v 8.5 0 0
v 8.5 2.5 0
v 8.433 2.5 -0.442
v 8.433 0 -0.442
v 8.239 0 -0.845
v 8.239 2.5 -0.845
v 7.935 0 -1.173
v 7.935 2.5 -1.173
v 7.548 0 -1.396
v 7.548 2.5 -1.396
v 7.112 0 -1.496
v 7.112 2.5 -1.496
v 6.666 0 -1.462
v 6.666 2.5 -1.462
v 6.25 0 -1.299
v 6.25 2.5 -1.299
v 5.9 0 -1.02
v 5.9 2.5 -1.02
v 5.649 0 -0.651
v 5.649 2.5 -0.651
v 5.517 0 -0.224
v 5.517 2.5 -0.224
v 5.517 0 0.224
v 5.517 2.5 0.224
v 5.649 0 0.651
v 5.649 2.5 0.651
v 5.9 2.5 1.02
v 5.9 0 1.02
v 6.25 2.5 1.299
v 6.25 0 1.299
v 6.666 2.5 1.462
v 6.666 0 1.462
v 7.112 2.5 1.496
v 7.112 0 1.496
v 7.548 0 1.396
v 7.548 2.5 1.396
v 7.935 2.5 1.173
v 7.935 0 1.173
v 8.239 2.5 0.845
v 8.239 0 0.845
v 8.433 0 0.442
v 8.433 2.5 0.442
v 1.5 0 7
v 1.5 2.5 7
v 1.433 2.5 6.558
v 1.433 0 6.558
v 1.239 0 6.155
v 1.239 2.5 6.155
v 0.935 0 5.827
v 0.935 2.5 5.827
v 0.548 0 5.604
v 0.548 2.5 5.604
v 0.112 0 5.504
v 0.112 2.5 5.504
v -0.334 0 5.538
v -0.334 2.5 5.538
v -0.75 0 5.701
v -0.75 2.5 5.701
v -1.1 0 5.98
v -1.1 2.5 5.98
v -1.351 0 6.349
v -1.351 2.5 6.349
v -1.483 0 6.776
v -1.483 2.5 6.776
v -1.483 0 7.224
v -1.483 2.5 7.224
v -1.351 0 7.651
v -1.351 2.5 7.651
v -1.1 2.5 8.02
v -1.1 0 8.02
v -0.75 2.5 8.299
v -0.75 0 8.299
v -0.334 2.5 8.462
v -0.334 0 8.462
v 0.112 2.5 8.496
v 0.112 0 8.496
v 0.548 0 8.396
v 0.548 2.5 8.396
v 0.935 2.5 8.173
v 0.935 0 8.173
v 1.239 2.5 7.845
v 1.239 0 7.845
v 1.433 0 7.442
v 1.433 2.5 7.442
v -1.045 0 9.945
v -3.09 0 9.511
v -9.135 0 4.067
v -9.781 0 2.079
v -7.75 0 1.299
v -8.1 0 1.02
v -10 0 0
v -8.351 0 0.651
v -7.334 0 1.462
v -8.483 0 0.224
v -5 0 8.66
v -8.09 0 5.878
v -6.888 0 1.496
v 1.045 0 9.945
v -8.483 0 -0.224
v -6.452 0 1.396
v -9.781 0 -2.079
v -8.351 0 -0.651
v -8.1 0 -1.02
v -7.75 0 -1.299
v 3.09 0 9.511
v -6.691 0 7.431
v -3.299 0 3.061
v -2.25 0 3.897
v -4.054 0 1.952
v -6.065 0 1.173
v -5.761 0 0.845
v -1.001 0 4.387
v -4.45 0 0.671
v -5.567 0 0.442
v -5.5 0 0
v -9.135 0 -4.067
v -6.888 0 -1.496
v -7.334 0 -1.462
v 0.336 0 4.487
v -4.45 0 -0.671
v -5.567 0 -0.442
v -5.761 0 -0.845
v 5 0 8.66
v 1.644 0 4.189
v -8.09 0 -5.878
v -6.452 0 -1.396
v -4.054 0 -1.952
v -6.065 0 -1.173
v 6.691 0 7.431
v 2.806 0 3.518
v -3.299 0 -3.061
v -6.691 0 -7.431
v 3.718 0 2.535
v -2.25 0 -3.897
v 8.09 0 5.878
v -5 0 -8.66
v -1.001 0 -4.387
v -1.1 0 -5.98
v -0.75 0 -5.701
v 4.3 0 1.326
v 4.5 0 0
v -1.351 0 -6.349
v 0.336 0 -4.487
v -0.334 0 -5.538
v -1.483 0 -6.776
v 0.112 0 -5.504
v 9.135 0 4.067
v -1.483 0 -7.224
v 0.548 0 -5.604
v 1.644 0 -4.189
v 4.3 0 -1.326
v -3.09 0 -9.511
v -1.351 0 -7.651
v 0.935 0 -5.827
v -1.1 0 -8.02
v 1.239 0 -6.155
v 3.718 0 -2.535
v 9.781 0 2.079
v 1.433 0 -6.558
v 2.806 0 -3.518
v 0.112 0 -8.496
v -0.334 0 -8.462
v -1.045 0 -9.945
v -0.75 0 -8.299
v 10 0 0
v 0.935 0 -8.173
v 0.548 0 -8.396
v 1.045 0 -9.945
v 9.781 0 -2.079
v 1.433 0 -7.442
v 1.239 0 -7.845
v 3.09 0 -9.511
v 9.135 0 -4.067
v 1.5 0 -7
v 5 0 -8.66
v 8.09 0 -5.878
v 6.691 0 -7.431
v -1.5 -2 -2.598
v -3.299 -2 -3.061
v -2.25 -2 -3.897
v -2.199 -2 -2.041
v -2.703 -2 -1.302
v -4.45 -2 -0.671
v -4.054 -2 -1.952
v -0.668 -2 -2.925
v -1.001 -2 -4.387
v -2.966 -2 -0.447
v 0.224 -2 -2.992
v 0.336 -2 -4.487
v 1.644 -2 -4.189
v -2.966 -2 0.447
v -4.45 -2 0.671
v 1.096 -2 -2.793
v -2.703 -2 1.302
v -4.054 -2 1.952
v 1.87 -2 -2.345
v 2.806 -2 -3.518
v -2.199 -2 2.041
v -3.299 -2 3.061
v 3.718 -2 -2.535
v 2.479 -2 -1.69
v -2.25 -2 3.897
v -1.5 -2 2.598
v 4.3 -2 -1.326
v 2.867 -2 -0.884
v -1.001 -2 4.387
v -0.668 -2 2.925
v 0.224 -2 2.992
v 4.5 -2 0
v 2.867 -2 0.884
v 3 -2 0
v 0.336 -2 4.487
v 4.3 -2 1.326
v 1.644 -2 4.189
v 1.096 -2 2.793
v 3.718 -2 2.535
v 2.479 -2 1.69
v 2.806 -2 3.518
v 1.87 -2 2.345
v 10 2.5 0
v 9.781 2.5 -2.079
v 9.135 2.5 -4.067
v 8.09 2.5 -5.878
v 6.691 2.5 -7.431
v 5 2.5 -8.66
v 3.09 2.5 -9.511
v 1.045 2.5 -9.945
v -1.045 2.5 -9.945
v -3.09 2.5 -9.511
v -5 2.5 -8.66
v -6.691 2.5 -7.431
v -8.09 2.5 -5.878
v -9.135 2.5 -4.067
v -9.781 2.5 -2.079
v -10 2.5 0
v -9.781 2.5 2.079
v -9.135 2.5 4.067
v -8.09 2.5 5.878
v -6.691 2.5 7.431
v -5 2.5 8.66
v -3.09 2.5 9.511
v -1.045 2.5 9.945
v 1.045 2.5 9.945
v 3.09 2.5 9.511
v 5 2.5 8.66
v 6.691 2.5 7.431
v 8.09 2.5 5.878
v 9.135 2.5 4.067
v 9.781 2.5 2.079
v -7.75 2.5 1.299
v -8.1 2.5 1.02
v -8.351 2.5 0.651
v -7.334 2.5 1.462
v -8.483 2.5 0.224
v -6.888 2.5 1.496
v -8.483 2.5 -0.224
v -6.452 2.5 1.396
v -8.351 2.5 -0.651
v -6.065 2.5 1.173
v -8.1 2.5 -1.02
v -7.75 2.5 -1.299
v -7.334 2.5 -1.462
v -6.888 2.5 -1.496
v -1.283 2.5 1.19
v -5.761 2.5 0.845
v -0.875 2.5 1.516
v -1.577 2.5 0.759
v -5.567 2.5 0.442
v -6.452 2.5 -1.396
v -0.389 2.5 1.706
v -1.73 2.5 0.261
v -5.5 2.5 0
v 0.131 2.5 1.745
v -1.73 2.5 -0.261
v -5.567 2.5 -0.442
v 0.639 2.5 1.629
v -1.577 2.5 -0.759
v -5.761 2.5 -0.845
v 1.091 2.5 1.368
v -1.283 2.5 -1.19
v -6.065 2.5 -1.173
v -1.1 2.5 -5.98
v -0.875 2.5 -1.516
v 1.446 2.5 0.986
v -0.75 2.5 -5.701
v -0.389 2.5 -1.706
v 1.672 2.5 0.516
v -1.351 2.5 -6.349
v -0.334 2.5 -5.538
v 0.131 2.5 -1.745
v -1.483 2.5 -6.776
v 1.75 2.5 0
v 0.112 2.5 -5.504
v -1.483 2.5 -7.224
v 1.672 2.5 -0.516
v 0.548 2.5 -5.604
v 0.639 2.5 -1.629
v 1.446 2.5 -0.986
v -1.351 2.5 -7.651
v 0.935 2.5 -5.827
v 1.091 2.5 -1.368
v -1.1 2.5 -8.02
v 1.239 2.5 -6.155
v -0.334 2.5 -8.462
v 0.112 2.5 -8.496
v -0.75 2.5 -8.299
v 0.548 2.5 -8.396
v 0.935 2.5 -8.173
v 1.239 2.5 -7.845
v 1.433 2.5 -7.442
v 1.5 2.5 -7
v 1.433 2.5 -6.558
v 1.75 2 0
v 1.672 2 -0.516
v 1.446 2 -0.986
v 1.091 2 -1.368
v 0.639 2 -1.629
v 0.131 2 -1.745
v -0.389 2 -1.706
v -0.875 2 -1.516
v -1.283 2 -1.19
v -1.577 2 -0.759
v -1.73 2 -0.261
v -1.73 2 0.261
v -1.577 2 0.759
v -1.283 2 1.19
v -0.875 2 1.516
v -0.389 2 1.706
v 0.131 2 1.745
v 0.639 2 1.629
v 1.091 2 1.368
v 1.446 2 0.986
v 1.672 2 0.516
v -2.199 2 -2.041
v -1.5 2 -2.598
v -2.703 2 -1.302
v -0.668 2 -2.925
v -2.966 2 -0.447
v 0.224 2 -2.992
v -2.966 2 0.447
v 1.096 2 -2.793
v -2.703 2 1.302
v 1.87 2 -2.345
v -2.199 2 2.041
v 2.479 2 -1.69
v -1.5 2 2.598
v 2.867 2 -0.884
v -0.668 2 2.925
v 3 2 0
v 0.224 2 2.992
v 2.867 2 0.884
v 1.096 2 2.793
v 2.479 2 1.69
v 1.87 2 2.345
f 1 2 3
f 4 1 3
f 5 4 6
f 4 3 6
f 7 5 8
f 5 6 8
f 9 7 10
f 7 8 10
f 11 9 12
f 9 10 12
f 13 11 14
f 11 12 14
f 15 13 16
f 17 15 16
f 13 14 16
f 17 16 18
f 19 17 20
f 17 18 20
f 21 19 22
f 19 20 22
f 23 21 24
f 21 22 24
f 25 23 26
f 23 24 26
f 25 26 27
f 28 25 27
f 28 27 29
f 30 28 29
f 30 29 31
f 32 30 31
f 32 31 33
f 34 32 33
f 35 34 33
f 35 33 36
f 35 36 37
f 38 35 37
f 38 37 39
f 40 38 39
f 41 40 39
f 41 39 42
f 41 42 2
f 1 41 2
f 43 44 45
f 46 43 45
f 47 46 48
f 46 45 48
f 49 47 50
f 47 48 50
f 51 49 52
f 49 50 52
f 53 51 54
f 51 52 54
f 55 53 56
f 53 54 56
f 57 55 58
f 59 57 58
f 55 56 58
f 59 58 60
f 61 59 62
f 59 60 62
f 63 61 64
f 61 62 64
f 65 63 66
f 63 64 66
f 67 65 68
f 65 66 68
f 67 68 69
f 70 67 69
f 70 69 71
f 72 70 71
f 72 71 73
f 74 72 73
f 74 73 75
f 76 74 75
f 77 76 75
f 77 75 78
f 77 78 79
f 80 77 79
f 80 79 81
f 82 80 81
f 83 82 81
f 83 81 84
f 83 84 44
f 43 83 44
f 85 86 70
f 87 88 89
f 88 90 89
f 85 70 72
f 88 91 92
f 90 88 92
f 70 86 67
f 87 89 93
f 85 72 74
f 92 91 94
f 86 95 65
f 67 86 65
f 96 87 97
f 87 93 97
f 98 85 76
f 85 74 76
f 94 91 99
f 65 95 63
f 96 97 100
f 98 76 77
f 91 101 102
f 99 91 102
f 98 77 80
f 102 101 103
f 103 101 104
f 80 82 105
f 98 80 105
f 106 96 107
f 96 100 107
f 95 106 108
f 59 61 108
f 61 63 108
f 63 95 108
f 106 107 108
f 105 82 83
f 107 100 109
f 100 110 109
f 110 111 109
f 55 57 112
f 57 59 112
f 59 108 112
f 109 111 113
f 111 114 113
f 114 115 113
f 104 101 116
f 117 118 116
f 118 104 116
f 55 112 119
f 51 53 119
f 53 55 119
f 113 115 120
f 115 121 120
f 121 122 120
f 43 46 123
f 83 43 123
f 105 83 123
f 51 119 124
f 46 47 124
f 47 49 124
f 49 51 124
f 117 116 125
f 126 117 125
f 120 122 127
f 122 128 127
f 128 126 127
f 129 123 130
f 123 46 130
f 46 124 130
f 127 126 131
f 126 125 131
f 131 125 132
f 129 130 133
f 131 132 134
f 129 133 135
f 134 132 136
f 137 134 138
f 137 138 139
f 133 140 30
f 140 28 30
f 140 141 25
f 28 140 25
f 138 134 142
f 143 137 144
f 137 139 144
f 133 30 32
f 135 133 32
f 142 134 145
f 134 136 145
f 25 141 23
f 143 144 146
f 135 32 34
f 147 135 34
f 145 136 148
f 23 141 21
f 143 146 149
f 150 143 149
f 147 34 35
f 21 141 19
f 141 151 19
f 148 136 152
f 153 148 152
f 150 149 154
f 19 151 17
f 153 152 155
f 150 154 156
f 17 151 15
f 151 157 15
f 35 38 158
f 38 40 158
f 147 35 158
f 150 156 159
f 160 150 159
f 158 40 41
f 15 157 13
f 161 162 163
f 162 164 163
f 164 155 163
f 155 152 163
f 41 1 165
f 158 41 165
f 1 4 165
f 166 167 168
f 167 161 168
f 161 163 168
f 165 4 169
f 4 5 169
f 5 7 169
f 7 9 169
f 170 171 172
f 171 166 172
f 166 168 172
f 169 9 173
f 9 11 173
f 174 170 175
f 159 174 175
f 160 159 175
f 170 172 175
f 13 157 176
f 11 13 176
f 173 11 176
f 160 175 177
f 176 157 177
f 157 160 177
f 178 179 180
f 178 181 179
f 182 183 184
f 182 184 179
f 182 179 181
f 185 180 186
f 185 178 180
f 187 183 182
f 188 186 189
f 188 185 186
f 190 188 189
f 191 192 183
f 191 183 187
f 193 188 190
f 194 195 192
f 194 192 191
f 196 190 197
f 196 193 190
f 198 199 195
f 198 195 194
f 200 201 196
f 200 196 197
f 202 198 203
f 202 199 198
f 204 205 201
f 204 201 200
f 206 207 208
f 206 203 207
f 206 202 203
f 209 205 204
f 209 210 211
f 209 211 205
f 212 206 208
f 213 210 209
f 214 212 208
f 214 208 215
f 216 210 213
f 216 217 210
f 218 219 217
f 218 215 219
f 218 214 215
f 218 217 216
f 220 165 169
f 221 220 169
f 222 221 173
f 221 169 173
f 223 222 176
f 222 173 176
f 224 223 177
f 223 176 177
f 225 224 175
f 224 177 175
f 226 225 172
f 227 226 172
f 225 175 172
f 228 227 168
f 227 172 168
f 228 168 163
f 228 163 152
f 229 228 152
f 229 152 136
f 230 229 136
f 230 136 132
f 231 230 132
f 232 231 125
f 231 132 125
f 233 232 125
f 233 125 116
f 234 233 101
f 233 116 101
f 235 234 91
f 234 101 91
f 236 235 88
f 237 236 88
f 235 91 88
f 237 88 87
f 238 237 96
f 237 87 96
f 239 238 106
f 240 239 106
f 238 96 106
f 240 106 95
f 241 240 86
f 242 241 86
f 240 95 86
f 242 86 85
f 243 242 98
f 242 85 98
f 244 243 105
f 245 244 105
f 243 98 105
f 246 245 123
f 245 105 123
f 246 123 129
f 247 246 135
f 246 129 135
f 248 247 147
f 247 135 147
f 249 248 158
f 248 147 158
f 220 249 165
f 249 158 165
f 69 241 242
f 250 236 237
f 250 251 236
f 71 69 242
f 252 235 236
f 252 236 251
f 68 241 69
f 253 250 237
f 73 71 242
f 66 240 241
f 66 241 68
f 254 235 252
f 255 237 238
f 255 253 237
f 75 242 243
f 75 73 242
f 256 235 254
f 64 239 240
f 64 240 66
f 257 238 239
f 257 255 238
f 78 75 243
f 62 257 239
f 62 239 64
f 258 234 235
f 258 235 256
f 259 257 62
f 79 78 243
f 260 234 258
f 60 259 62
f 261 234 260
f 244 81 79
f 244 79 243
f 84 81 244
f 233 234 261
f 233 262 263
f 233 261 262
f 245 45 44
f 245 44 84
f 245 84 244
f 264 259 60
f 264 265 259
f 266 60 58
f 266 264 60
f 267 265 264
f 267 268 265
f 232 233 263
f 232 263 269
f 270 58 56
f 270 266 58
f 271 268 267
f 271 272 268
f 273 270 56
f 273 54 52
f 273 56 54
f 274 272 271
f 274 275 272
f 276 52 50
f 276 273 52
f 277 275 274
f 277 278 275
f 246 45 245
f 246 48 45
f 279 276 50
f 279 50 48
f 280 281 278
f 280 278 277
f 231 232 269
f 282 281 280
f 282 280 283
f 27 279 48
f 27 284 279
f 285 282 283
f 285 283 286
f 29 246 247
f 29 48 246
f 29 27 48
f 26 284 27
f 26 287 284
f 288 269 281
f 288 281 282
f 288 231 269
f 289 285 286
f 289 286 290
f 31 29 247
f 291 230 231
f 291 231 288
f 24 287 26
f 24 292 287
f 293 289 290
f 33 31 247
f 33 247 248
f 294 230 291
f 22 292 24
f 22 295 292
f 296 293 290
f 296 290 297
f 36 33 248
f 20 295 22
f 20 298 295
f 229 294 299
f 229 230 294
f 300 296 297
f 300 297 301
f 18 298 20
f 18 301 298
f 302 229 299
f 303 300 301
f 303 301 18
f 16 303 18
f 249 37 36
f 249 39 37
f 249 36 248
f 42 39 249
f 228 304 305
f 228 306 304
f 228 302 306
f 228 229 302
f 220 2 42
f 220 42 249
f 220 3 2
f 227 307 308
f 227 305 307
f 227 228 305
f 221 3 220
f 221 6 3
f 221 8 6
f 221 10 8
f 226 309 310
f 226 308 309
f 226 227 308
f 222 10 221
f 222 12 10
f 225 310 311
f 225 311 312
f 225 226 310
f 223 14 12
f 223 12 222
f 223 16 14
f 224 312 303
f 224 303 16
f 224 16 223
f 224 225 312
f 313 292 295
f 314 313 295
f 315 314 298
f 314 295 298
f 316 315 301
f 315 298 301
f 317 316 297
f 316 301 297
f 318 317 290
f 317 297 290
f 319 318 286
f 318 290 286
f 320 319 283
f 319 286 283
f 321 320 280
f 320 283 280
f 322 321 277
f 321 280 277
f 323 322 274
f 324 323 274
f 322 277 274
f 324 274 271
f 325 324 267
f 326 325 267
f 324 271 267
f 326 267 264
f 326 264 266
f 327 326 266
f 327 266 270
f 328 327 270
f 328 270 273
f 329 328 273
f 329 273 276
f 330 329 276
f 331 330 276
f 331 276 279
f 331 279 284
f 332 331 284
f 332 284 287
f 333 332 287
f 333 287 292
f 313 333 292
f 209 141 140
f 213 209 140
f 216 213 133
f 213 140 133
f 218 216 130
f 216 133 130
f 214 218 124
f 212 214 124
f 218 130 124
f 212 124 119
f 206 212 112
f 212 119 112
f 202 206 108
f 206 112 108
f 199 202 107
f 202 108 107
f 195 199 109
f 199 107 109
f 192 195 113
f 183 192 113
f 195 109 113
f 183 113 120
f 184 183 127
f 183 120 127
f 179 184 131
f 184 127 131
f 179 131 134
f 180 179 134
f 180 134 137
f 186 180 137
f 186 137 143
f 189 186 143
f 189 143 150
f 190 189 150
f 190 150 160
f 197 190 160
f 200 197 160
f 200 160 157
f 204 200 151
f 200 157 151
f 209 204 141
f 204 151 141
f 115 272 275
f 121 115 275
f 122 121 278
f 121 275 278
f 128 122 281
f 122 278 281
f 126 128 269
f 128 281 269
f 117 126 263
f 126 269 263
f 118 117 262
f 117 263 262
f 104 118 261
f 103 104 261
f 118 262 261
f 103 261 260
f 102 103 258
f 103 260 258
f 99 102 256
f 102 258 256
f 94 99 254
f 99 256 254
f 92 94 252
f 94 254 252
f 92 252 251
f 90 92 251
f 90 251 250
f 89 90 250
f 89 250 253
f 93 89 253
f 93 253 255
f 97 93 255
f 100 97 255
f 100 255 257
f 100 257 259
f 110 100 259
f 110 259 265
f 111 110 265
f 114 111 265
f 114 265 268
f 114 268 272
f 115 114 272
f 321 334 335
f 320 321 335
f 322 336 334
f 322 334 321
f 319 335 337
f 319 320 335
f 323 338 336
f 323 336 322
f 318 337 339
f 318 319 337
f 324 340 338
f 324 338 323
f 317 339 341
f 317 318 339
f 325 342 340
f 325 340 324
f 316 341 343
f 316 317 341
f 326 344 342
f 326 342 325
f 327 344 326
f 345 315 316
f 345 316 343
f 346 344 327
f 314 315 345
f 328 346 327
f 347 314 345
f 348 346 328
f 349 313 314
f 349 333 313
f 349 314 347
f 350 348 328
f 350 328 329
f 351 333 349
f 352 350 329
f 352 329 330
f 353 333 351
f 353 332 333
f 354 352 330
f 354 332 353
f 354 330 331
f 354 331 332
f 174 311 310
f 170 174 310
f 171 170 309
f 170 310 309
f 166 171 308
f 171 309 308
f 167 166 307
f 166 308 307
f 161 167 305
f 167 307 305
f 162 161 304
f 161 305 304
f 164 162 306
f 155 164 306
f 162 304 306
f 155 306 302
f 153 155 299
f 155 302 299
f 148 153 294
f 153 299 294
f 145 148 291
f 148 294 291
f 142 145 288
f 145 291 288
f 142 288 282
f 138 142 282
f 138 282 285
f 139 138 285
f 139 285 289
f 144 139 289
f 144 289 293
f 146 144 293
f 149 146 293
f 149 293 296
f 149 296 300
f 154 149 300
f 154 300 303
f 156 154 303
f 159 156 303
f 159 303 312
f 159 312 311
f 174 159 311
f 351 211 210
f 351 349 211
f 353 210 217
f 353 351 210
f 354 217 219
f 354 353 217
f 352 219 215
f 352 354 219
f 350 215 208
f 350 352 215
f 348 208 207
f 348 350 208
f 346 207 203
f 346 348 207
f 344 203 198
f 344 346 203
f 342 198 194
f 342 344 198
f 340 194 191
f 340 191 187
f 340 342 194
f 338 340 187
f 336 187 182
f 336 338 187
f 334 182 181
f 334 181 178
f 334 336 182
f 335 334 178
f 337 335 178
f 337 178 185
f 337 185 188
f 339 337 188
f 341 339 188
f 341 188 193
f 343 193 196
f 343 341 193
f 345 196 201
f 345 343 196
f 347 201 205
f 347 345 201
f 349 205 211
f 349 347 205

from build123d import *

# Parameters (mm, degrees)
SKETCH1_R           = 10
BOSS_EXTRUDE1_DEPTH = 2.5
SKETCH2_R           = 4.5
SKETCH2_R_2         = 3
BOSS_EXTRUDE2_DEPTH = 2
SKETCH3_R           = 1.5
SKETCH3_R_2         = 1.75
CUT_EXTRUDE1_DEPTH  = 15.84082208
CUT_EXTRUDE2_START  = -2
SKETCH2_2_R         = 3
CUT_EXTRUDE2_DEPTH  = 2


with BuildPart() as part:
    # Sketch1 → Boss-Extrude1 (new body)
    with BuildSketch(Plane(origin=(0, 0, 0), x_dir=(1, 0, 0), z_dir=(0, 1, 0))):
        Circle(SKETCH1_R)
    extrude(amount=BOSS_EXTRUDE1_DEPTH)

    # Sketch2 → Boss-Extrude2 (add)
    with BuildSketch(Plane.XZ):
        Circle(SKETCH2_R)
        Circle(SKETCH2_R_2, mode=Mode.SUBTRACT)
    extrude(amount=BOSS_EXTRUDE2_DEPTH)

    # Sketch3 → Cut-Extrude1 (cut, through all)
    with BuildSketch(Plane(origin=(0, 2.5, 0), x_dir=(1, 0, 0), z_dir=(0, 1, 0))):
        with Locations((0, 7)):
            Circle(SKETCH3_R)
        with Locations((7, 0)):
            Circle(SKETCH3_R)
        with Locations((0, -7)):
            Circle(SKETCH3_R)
        with Locations((-7, 0)):
            Circle(SKETCH3_R)
        Circle(SKETCH3_R_2)
    extrude(amount=-CUT_EXTRUDE1_DEPTH, mode=Mode.SUBTRACT)

    # Sketch2<2> → Cut-Extrude2 (cut)
    with BuildSketch(Plane.XZ.offset(CUT_EXTRUDE2_START)):
        Circle(SKETCH2_2_R)
    extrude(amount=CUT_EXTRUDE2_DEPTH, mode=Mode.SUBTRACT)


solid = part.part
